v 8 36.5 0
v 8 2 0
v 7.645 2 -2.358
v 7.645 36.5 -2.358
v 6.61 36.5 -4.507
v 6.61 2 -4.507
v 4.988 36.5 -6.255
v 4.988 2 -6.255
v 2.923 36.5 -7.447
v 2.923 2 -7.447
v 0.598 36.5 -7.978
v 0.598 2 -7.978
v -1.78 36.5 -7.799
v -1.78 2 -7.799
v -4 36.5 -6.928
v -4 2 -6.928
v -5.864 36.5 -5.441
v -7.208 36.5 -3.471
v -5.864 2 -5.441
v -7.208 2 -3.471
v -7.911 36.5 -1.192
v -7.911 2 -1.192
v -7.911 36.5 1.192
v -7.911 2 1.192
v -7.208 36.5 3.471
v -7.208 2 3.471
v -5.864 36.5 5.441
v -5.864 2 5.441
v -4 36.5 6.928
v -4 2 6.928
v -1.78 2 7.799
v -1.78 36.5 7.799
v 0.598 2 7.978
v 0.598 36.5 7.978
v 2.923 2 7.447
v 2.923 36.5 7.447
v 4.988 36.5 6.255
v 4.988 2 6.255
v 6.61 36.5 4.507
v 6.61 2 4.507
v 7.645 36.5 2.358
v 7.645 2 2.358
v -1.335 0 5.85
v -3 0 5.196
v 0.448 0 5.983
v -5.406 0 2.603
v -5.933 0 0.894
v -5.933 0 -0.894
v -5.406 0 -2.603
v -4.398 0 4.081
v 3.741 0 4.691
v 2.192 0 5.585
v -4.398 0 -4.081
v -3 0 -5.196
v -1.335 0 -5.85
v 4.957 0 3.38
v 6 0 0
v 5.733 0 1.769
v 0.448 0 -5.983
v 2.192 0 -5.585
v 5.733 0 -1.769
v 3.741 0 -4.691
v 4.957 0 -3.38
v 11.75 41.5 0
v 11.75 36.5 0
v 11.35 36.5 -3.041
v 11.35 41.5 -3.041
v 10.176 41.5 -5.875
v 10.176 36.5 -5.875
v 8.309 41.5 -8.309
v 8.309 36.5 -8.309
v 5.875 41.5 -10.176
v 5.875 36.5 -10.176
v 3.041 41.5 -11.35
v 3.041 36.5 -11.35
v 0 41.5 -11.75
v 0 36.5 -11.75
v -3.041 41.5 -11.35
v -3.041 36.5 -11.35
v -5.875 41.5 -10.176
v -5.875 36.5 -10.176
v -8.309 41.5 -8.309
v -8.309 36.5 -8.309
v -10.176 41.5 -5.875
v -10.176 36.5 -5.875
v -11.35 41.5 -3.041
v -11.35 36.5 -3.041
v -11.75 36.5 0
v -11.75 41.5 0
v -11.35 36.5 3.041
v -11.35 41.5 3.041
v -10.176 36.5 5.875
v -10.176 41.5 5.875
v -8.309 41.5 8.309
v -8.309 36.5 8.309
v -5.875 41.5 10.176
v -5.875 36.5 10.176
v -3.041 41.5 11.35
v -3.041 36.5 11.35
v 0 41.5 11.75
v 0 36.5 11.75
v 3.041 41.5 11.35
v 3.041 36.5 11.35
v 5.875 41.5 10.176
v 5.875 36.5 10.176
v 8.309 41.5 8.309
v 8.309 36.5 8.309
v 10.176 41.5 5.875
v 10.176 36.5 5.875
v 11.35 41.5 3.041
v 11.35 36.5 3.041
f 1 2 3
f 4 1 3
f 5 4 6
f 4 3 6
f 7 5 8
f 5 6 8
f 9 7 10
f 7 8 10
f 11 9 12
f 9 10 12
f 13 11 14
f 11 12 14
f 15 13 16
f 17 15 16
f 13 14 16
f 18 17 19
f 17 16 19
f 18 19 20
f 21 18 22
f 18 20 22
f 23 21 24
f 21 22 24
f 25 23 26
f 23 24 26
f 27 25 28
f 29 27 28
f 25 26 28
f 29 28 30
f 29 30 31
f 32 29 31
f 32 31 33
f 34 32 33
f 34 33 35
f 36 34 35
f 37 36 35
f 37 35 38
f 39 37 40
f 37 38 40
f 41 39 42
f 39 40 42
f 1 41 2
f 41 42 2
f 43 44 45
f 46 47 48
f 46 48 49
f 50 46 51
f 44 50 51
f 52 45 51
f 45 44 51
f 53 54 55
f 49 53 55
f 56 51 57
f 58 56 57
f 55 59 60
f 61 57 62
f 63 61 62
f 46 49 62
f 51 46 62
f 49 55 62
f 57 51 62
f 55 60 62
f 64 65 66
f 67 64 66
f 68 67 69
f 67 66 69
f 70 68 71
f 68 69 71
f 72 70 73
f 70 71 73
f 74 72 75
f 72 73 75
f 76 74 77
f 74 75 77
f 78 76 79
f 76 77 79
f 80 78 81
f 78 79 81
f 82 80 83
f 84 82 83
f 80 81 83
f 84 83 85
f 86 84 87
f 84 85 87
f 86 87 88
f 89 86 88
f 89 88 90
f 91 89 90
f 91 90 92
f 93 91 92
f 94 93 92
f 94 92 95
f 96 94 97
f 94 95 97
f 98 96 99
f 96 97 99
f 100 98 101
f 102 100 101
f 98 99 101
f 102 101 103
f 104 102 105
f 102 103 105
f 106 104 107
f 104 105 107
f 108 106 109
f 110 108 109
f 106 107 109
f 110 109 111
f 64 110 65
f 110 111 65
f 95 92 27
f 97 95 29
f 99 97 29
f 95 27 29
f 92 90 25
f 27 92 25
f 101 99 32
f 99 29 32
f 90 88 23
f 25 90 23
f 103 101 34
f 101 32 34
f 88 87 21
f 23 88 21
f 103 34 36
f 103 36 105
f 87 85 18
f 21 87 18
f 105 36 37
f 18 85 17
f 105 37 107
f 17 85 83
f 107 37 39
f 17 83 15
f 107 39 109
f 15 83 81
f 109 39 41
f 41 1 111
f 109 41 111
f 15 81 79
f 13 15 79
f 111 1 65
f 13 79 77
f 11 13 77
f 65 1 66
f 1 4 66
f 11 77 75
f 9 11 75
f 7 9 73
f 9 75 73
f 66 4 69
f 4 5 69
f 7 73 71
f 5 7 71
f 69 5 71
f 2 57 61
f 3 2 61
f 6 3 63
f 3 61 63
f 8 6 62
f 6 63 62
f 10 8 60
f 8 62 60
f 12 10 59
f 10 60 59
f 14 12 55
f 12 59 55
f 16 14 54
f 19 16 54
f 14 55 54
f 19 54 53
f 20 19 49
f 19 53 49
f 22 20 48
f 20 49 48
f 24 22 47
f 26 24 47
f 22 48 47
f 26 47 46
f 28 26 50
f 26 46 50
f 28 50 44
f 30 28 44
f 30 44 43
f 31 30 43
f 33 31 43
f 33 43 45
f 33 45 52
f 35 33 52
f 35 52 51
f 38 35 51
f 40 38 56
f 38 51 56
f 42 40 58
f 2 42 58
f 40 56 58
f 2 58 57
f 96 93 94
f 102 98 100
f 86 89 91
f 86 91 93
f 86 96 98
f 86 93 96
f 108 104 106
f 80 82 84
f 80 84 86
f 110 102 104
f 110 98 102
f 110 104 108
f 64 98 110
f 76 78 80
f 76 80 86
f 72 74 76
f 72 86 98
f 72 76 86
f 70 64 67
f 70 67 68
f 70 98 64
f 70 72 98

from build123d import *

# Parameters (mm, degrees)
SKETCH1_R           = 8
BOSS_EXTRUDE1_DEPTH = 36.5
CHAMFER1_SIZE       = 2
SKETCH2_R           = 11.75
BOSS_EXTRUDE2_DEPTH = 5


with BuildPart() as part:
    # Sketch1 → Boss-Extrude1 (new body)
    with BuildSketch(Plane(origin=(0, 0, 0), x_dir=(1, 0, 0), z_dir=(0, 1, 0))):
        Circle(SKETCH1_R)
    extrude(amount=BOSS_EXTRUDE1_DEPTH)

    # Chamfer1
    chamfer1_edges = [part.edges().sort_by_distance(p)[0] for p in [
        (-8, 0, 0),
    ]]
    chamfer(chamfer1_edges, length=CHAMFER1_SIZE)

    # Sketch2 → Boss-Extrude2 (add)
    with BuildSketch(Plane(origin=(0, 36.5, 0), x_dir=(1, 0, 0), z_dir=(0, 1, 0))):
        Circle(SKETCH2_R)
    extrude(amount=BOSS_EXTRUDE2_DEPTH)


solid = part.part
